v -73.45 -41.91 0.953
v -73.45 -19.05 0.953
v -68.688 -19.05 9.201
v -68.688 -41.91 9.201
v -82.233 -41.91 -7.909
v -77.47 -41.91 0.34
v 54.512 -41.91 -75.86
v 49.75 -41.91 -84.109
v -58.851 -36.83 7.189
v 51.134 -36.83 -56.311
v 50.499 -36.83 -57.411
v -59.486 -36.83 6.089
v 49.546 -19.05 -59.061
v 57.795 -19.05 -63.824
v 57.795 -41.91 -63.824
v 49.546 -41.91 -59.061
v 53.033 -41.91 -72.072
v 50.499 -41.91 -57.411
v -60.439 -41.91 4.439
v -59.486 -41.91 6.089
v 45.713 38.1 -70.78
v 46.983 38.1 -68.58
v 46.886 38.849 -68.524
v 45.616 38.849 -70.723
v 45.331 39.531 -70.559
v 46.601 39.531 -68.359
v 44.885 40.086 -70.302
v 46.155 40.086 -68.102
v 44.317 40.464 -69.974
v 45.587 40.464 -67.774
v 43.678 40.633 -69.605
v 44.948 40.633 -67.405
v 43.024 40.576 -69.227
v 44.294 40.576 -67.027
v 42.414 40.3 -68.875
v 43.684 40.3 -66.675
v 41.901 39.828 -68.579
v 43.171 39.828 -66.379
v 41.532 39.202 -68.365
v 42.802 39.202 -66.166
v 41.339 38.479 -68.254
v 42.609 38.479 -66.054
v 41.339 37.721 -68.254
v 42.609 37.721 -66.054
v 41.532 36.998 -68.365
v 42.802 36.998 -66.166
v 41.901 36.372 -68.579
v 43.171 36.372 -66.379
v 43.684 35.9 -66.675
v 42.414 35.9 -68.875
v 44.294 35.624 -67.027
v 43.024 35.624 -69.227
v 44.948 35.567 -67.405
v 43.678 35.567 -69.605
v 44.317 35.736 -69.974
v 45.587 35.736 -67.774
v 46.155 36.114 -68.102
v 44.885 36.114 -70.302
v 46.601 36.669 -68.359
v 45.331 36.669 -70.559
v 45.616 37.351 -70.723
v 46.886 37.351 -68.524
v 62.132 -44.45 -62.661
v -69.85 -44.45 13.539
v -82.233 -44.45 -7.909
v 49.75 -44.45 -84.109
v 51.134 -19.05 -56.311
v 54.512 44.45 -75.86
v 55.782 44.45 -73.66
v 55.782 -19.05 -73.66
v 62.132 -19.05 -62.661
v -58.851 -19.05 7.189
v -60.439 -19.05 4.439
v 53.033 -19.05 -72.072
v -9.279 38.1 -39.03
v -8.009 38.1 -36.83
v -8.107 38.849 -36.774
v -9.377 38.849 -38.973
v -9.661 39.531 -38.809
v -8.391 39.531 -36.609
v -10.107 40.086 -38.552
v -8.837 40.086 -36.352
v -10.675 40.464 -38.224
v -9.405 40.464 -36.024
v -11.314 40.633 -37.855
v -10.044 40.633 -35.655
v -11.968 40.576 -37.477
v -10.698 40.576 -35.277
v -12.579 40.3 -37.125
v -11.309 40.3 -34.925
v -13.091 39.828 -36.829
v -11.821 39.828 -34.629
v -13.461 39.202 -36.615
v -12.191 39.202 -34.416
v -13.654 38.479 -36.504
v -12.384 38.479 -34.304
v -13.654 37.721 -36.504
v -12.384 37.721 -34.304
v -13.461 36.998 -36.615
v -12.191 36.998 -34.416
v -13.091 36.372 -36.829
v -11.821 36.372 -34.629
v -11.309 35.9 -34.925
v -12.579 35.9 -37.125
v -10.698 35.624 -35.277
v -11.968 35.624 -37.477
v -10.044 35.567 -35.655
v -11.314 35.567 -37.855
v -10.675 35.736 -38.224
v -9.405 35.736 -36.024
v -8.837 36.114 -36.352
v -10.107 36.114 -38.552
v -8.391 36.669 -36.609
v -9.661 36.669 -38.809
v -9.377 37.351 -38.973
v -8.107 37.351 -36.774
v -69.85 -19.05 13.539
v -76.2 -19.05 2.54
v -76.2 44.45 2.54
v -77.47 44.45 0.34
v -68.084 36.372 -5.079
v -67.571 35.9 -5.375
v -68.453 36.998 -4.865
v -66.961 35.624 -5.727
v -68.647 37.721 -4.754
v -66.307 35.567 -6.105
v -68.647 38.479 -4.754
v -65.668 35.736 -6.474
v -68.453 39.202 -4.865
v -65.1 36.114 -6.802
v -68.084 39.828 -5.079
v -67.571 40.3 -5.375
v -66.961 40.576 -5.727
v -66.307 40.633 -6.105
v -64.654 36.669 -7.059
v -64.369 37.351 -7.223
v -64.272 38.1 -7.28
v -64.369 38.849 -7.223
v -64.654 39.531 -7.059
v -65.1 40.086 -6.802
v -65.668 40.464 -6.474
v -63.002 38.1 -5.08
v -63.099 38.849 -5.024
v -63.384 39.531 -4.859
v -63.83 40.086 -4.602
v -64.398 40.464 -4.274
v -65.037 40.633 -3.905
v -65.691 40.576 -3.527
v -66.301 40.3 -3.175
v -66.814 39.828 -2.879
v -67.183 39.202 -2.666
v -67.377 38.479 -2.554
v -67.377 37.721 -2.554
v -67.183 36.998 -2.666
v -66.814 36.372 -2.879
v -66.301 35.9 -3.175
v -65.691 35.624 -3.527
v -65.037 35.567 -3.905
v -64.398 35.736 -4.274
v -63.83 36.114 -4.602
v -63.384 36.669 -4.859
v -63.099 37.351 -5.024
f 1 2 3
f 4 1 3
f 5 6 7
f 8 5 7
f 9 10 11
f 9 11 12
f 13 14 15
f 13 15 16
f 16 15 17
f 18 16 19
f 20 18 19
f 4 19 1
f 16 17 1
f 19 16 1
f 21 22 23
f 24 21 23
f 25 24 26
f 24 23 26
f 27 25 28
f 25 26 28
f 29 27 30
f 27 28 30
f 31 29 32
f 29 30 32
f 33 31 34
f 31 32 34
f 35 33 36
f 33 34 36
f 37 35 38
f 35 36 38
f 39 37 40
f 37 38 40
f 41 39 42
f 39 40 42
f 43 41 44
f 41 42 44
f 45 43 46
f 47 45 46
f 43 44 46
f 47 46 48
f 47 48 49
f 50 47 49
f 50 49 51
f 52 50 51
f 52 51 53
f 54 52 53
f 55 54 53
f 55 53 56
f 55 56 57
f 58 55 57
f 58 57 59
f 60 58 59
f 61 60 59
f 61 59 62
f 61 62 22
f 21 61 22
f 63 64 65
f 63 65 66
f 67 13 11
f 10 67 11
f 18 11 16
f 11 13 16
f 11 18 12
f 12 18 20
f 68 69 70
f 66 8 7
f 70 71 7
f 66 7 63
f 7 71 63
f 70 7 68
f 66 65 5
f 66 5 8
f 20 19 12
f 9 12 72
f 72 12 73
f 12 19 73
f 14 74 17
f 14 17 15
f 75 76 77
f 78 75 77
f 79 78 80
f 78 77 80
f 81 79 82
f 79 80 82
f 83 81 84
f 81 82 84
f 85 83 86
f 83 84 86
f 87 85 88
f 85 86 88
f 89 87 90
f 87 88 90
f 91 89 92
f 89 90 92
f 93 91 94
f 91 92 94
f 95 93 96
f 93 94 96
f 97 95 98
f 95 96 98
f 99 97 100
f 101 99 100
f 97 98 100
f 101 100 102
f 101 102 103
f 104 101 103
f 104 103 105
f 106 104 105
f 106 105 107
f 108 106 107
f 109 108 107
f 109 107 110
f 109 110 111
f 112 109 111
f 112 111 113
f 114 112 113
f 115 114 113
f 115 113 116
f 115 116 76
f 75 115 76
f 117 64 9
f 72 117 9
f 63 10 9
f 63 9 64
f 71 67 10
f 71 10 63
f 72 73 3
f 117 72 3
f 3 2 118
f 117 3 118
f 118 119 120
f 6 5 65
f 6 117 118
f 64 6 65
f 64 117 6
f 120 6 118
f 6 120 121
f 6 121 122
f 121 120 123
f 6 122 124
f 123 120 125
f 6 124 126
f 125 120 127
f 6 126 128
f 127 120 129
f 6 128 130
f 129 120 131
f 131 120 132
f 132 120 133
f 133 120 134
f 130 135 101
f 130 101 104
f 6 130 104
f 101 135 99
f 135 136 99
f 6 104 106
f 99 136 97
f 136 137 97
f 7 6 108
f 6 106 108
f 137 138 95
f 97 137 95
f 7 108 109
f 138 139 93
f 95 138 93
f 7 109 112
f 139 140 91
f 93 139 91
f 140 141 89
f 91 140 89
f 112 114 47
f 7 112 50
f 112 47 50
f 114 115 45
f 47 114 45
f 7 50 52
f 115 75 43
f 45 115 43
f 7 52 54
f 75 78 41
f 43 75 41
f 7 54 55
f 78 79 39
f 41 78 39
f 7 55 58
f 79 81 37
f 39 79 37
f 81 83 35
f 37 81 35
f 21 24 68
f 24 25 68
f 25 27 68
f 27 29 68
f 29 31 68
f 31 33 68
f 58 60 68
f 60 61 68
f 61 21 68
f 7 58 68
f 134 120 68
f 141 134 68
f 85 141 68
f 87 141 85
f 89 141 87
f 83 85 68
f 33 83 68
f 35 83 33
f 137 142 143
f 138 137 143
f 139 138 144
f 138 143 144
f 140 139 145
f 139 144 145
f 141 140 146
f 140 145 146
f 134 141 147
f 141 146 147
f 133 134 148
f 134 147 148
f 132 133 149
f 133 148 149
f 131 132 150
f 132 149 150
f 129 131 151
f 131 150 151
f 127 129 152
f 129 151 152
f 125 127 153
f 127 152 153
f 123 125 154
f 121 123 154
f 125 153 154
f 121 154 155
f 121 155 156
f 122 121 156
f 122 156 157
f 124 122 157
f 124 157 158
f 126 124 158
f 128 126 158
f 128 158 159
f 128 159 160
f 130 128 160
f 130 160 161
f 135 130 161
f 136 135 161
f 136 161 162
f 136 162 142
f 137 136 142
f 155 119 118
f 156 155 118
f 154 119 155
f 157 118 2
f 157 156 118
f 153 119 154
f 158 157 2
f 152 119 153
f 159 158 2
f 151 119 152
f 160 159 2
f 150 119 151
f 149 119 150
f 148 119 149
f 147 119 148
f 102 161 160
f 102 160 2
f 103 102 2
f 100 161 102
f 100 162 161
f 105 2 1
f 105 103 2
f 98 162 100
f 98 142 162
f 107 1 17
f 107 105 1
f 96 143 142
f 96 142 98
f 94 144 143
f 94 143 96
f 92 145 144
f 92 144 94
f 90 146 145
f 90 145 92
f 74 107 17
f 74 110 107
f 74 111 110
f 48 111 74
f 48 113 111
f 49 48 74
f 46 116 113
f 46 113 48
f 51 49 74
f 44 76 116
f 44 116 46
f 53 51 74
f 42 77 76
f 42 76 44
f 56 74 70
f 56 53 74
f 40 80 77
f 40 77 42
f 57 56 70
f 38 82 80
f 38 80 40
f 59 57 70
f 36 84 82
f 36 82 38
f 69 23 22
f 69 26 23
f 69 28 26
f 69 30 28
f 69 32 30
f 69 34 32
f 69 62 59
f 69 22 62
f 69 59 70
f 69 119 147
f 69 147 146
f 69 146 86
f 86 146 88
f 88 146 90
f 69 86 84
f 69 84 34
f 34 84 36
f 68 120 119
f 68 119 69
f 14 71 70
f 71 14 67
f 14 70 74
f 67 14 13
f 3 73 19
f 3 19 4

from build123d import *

# Parameters (mm, degrees)
F0_W      = 152.4
F0_H      = 88.9
F1_DEPTH  = 2.54
F3_DEPTH  = 12.7
F4_W      = 127
F4_H      = 1.27
F5_DEPTH  = 5.08
F6_W      = 146.05
F6_H      = 9.525
F7_DEPTH  = 22.86
F8_R      = 2.54
F9_DEPTH  = 2.541
F10_W     = 152.4
F10_H     = 2.54
F11_DEPTH = 9.525
F12_ANGLE = 30


with BuildPart() as f1:
    # F0 (on Top) → F1 (new body)
    with BuildSketch(Plane.XY):
        Rectangle(F0_W, F0_H)
    extrude(amount=F1_DEPTH)

    # F2 (on face) → F3 (join)
    with BuildSketch(Plane.XY.offset(2.54)):
        Polygon((63.5, -41.91), (-63.5, -41.91), (-63.5, -19.05), (-76.2, -19.05), (-76.2, -44.45), (76.2, -44.45), (76.2, -19.05), (63.5, -19.05), align=None)
    extrude(amount=F3_DEPTH)

    # F4 (on face) → F5 (join)
    with BuildSketch(Plane(origin=(0, -41.91, 0), x_dir=(-1, 0, 0), z_dir=(0, 1, 0))):
        with Locations((0, 14.605)):
            Rectangle(F4_W, F4_H)
    extrude(amount=F5_DEPTH)

    # F6 (on face) → F7 (cut, through all)
    with BuildSketch(Plane(origin=(0, -19.05, 0), x_dir=(-1, 0, 0), z_dir=(0, 1, 0))):
        with Locations((0, 7.3025)):
            Rectangle(F6_W, F6_H)
    extrude(amount=-F7_DEPTH, mode=Mode.SUBTRACT)

    # F8 (on face) → F9 (cut, through all)
    with BuildSketch(Plane.XY.offset(2.54)):
        with Locations((0, 38.1)):
            Circle(F8_R)
        with Locations((-63.5, 38.1)):
            Circle(F8_R)
        with Locations((63.5, 38.1)):
            Circle(F8_R)
    extrude(amount=-F9_DEPTH, mode=Mode.SUBTRACT)

    # F10 (on face) → F11 (join)
    with BuildSketch(Plane(origin=(0, 0, 0), x_dir=(1, 0, 0), z_dir=(0, 0, -1))):
        with Locations((0, 43.18)):
            Rectangle(F10_W, F10_H)
    extrude(amount=F11_DEPTH)


with BuildPart() as f1_1:
    # F12: moved
    add(f1.part.rotate(Axis((-76.2, 12.7, 2.54), (0, 1, 0)), F12_ANGLE))


solid = f1_1.part
